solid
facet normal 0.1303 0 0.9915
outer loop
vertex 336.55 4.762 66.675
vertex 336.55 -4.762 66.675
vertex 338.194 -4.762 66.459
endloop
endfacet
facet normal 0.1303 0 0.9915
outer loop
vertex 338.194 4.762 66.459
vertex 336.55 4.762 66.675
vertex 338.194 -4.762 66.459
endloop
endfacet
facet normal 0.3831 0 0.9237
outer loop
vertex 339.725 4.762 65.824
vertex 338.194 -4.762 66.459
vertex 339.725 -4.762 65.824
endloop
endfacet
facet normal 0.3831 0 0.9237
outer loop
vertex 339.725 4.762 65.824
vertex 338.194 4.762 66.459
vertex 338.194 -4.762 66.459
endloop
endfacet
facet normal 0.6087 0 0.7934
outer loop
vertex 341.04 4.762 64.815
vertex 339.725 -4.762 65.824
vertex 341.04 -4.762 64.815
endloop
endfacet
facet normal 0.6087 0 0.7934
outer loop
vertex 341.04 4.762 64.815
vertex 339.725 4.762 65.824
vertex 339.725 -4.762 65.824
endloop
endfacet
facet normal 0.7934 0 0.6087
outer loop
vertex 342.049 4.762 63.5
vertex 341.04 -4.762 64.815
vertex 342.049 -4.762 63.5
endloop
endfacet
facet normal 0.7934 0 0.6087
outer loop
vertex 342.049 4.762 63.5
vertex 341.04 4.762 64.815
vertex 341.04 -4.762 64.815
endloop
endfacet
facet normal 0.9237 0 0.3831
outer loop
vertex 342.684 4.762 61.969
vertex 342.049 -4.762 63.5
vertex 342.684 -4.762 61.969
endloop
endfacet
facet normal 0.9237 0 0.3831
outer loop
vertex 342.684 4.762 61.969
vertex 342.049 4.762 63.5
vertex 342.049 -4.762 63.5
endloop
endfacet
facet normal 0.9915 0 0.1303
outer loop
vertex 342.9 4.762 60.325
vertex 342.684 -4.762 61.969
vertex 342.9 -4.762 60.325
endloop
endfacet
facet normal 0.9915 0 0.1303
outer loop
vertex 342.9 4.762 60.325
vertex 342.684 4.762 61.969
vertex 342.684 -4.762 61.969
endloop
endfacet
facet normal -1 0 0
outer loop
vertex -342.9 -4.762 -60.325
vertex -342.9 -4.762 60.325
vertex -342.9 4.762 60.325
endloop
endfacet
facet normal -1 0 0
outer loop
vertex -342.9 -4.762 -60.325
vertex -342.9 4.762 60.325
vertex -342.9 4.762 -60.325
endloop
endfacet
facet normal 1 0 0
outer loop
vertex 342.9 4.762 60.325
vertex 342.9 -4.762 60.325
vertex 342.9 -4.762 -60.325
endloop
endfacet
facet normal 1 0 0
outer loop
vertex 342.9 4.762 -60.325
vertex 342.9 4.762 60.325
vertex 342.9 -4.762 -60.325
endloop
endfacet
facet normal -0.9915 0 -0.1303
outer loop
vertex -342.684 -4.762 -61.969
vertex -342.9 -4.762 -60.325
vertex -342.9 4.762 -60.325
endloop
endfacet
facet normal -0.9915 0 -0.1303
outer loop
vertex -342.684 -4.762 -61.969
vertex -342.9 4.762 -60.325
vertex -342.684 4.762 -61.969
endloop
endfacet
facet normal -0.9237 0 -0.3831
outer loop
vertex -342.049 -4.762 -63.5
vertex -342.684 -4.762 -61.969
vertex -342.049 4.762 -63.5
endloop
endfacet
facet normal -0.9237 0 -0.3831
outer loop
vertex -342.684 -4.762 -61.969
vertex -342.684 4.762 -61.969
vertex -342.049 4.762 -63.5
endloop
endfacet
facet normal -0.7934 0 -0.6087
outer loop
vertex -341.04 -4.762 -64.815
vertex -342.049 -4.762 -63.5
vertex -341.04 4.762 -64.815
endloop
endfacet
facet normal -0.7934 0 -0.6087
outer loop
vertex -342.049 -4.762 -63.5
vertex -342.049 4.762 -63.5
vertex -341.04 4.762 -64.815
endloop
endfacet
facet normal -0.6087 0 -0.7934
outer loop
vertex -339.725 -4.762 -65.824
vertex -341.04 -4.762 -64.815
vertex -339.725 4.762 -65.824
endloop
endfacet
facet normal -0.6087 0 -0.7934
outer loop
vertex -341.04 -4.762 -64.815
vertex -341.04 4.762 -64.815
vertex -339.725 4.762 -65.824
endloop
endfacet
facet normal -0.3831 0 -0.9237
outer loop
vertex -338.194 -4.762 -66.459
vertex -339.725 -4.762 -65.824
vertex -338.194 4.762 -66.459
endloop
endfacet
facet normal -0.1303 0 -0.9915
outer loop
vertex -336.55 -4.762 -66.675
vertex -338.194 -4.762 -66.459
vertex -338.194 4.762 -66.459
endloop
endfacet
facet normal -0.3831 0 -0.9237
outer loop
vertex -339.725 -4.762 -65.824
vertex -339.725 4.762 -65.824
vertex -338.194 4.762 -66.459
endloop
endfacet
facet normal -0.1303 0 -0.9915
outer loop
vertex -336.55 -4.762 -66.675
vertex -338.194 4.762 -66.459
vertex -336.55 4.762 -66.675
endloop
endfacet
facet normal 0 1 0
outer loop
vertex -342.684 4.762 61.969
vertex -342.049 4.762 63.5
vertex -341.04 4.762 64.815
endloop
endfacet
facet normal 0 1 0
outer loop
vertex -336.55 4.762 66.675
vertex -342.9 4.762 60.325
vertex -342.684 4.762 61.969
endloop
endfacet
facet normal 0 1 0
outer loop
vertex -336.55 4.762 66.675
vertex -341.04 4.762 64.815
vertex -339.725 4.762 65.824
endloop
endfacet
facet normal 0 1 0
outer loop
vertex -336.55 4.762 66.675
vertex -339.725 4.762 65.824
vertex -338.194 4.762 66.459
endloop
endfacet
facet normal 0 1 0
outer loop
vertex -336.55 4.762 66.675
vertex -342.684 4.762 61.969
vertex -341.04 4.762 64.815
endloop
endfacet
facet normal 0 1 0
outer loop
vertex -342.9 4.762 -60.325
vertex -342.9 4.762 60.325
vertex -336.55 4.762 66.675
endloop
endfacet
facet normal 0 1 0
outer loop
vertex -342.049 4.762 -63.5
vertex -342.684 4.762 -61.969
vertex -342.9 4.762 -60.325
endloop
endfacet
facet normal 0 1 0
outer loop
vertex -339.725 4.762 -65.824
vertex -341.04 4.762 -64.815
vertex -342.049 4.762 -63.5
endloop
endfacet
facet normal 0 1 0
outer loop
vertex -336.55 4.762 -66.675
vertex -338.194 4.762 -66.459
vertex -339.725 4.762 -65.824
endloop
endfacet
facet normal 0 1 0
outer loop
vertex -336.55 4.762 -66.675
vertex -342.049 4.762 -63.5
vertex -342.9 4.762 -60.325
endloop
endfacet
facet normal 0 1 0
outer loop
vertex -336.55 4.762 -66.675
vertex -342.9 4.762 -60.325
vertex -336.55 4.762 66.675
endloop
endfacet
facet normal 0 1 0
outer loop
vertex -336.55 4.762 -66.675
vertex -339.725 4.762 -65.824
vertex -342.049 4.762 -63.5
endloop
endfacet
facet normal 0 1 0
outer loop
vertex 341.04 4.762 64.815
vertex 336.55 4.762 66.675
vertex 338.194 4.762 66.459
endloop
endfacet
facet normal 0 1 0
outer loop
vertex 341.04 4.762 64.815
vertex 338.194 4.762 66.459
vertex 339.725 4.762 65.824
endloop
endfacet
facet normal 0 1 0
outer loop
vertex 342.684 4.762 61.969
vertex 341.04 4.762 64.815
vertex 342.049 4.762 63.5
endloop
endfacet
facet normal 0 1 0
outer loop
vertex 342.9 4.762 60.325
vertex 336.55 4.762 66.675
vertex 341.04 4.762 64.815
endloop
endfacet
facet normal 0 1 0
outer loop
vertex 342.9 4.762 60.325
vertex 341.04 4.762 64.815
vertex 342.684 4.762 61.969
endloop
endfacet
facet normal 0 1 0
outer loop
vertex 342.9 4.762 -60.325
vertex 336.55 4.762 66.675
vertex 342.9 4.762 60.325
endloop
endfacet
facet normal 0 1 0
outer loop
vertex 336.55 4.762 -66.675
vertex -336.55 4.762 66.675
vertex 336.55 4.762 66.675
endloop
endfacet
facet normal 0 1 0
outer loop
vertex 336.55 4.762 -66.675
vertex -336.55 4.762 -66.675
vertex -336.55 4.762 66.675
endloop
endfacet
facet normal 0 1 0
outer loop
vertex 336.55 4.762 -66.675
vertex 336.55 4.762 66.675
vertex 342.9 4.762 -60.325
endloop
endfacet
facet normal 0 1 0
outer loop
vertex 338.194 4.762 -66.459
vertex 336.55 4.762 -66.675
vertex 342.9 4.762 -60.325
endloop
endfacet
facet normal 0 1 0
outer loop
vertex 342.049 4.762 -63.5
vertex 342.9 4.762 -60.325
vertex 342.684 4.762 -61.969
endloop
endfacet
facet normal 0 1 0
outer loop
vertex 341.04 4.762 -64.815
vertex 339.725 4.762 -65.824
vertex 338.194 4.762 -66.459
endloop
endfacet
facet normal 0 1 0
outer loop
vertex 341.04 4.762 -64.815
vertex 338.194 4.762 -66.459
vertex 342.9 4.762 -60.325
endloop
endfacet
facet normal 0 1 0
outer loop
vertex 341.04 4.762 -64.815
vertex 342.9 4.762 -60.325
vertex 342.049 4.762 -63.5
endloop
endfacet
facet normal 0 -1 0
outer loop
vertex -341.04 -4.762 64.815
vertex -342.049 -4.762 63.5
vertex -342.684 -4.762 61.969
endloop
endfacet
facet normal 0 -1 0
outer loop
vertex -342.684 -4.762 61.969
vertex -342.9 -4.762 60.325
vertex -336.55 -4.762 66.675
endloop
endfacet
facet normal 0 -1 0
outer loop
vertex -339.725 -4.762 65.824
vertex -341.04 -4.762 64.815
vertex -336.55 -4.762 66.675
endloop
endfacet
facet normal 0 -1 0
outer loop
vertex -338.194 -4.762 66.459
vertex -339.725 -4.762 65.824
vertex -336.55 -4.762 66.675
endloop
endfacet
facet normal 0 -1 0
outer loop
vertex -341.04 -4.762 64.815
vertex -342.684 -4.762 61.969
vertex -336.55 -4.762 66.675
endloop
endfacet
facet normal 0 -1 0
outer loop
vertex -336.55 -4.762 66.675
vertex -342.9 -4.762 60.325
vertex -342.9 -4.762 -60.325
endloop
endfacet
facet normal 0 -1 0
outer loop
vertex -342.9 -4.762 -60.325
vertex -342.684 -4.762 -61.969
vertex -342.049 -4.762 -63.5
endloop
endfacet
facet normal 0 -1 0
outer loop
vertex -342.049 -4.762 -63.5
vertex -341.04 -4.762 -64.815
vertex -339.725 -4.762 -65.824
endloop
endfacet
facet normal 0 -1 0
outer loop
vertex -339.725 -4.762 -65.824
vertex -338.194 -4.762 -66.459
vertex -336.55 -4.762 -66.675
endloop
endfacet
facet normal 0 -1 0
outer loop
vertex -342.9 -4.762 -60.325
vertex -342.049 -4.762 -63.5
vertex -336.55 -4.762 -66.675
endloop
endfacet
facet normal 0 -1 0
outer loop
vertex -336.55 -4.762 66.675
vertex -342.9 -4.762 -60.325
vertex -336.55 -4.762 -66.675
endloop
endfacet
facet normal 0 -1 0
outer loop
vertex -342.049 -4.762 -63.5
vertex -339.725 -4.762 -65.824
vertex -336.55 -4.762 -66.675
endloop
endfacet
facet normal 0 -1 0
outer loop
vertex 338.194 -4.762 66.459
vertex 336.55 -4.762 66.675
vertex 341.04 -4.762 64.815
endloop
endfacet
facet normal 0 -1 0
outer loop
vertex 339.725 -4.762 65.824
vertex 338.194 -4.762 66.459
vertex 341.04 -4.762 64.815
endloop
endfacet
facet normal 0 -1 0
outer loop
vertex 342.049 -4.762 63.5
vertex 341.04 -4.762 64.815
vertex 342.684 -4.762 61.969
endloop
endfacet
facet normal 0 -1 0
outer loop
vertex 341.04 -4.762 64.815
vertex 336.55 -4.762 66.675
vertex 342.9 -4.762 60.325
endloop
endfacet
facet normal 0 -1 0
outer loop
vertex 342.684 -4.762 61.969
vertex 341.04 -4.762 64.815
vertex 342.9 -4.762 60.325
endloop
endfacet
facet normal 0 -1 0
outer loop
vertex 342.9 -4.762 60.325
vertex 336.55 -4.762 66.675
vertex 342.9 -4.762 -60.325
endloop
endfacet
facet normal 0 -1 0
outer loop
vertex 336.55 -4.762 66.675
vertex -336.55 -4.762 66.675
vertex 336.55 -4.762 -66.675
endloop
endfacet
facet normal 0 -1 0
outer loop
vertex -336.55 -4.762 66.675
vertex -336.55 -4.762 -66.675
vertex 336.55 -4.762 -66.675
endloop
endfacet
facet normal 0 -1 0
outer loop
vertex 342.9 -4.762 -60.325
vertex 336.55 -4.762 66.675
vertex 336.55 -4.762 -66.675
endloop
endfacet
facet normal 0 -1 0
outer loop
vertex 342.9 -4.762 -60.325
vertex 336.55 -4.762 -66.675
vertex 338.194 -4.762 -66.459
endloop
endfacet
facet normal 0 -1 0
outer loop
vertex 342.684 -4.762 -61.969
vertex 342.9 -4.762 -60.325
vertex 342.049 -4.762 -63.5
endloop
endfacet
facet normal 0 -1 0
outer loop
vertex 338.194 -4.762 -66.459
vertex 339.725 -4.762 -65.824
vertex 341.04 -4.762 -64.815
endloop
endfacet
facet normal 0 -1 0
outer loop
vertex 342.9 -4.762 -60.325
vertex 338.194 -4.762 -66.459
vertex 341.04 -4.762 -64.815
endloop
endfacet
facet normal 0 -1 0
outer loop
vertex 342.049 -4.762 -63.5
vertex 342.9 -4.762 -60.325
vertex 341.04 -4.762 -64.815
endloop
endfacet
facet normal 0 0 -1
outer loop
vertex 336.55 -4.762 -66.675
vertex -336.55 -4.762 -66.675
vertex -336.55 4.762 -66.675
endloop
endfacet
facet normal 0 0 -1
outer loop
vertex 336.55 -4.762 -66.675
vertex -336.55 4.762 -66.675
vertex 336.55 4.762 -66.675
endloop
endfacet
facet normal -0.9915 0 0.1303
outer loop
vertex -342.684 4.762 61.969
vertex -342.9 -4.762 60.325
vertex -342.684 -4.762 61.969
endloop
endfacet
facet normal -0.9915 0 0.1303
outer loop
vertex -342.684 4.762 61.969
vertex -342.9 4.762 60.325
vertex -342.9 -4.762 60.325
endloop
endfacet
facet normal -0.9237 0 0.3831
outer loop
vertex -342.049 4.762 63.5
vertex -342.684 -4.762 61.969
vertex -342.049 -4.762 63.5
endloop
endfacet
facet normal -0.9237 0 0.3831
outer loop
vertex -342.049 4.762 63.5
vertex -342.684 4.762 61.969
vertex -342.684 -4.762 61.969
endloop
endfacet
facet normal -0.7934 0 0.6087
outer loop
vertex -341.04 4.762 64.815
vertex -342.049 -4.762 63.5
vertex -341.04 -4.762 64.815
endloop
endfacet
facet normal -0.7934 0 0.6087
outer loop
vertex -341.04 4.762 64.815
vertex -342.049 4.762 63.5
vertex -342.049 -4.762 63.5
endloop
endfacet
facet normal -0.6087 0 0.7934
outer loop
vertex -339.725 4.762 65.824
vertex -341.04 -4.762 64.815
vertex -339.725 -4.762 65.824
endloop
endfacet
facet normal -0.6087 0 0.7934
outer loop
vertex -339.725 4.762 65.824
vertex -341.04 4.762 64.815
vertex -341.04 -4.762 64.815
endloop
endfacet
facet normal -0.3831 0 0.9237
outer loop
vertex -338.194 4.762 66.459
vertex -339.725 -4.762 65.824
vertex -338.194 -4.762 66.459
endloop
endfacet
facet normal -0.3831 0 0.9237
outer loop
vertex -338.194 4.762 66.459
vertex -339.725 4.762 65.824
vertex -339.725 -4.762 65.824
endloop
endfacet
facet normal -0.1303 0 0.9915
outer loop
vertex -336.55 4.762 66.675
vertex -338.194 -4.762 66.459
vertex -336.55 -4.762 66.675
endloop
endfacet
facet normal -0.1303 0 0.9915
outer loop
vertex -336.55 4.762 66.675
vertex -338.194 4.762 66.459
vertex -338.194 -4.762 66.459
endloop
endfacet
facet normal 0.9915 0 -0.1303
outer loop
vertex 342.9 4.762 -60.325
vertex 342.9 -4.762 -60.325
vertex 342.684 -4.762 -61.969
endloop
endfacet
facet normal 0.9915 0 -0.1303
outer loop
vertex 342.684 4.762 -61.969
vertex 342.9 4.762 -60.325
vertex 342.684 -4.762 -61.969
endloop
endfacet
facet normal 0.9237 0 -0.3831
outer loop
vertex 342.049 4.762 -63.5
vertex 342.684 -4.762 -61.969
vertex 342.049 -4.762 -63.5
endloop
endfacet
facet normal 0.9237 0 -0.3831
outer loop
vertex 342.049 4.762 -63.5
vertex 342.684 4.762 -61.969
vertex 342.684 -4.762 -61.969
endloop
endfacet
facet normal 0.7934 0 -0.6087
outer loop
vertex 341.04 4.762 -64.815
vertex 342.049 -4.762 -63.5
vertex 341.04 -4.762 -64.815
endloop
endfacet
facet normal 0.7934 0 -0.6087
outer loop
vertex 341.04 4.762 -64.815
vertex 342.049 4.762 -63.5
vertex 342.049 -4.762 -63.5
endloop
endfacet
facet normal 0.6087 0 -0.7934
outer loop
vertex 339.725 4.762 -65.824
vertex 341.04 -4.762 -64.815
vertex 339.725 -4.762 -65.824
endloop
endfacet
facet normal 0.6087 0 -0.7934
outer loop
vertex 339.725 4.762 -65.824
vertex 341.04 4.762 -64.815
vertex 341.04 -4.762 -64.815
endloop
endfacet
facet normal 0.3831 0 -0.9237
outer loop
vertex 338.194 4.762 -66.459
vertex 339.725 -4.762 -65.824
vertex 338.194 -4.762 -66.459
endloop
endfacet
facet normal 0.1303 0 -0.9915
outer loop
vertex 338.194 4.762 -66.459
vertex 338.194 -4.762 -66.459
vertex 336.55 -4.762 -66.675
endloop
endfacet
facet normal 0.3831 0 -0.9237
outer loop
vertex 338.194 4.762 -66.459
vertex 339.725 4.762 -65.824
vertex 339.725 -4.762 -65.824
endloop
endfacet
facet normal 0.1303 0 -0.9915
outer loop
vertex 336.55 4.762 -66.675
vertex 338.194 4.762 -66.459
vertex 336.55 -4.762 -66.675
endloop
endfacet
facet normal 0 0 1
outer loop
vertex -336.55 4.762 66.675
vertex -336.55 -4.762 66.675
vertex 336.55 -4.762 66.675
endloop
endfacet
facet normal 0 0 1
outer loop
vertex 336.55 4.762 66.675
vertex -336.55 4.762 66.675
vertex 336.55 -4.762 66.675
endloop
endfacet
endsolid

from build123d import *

# Parameters (mm, degrees)
BASE_FLANGE1_START     = -4.7625
BASE_FLANGE1_OUTLINE_W = 685.8
BASE_FLANGE1_OUTLINE_H = 133.35
BASE_FLANGE1_DEPTH     = 9.525
FILLET1_R              = 6.35


# Read off the part's stored shape, not the designer's step: Base-Flange1
with BuildPart() as part:
    # Base-Flange1 outline → Base-Flange1 (new body)
    with BuildSketch(Plane(origin=(0, 0, 0), x_dir=(1, 0, 0), z_dir=(0, 1, 0)).offset(BASE_FLANGE1_START)):
        Rectangle(BASE_FLANGE1_OUTLINE_W, BASE_FLANGE1_OUTLINE_H)
    extrude(amount=BASE_FLANGE1_DEPTH)

    # Fillet1
    fillet1_edges = [part.edges().sort_by_distance(p)[0] for p in [
        (342.9, 0, 66.675),
        (-342.9, 0, 66.675),
        (-342.9, 0, -66.675),
        (342.9, 0, -66.675),
    ]]
    fillet(fillet1_edges, radius=FILLET1_R)


solid = part.part
